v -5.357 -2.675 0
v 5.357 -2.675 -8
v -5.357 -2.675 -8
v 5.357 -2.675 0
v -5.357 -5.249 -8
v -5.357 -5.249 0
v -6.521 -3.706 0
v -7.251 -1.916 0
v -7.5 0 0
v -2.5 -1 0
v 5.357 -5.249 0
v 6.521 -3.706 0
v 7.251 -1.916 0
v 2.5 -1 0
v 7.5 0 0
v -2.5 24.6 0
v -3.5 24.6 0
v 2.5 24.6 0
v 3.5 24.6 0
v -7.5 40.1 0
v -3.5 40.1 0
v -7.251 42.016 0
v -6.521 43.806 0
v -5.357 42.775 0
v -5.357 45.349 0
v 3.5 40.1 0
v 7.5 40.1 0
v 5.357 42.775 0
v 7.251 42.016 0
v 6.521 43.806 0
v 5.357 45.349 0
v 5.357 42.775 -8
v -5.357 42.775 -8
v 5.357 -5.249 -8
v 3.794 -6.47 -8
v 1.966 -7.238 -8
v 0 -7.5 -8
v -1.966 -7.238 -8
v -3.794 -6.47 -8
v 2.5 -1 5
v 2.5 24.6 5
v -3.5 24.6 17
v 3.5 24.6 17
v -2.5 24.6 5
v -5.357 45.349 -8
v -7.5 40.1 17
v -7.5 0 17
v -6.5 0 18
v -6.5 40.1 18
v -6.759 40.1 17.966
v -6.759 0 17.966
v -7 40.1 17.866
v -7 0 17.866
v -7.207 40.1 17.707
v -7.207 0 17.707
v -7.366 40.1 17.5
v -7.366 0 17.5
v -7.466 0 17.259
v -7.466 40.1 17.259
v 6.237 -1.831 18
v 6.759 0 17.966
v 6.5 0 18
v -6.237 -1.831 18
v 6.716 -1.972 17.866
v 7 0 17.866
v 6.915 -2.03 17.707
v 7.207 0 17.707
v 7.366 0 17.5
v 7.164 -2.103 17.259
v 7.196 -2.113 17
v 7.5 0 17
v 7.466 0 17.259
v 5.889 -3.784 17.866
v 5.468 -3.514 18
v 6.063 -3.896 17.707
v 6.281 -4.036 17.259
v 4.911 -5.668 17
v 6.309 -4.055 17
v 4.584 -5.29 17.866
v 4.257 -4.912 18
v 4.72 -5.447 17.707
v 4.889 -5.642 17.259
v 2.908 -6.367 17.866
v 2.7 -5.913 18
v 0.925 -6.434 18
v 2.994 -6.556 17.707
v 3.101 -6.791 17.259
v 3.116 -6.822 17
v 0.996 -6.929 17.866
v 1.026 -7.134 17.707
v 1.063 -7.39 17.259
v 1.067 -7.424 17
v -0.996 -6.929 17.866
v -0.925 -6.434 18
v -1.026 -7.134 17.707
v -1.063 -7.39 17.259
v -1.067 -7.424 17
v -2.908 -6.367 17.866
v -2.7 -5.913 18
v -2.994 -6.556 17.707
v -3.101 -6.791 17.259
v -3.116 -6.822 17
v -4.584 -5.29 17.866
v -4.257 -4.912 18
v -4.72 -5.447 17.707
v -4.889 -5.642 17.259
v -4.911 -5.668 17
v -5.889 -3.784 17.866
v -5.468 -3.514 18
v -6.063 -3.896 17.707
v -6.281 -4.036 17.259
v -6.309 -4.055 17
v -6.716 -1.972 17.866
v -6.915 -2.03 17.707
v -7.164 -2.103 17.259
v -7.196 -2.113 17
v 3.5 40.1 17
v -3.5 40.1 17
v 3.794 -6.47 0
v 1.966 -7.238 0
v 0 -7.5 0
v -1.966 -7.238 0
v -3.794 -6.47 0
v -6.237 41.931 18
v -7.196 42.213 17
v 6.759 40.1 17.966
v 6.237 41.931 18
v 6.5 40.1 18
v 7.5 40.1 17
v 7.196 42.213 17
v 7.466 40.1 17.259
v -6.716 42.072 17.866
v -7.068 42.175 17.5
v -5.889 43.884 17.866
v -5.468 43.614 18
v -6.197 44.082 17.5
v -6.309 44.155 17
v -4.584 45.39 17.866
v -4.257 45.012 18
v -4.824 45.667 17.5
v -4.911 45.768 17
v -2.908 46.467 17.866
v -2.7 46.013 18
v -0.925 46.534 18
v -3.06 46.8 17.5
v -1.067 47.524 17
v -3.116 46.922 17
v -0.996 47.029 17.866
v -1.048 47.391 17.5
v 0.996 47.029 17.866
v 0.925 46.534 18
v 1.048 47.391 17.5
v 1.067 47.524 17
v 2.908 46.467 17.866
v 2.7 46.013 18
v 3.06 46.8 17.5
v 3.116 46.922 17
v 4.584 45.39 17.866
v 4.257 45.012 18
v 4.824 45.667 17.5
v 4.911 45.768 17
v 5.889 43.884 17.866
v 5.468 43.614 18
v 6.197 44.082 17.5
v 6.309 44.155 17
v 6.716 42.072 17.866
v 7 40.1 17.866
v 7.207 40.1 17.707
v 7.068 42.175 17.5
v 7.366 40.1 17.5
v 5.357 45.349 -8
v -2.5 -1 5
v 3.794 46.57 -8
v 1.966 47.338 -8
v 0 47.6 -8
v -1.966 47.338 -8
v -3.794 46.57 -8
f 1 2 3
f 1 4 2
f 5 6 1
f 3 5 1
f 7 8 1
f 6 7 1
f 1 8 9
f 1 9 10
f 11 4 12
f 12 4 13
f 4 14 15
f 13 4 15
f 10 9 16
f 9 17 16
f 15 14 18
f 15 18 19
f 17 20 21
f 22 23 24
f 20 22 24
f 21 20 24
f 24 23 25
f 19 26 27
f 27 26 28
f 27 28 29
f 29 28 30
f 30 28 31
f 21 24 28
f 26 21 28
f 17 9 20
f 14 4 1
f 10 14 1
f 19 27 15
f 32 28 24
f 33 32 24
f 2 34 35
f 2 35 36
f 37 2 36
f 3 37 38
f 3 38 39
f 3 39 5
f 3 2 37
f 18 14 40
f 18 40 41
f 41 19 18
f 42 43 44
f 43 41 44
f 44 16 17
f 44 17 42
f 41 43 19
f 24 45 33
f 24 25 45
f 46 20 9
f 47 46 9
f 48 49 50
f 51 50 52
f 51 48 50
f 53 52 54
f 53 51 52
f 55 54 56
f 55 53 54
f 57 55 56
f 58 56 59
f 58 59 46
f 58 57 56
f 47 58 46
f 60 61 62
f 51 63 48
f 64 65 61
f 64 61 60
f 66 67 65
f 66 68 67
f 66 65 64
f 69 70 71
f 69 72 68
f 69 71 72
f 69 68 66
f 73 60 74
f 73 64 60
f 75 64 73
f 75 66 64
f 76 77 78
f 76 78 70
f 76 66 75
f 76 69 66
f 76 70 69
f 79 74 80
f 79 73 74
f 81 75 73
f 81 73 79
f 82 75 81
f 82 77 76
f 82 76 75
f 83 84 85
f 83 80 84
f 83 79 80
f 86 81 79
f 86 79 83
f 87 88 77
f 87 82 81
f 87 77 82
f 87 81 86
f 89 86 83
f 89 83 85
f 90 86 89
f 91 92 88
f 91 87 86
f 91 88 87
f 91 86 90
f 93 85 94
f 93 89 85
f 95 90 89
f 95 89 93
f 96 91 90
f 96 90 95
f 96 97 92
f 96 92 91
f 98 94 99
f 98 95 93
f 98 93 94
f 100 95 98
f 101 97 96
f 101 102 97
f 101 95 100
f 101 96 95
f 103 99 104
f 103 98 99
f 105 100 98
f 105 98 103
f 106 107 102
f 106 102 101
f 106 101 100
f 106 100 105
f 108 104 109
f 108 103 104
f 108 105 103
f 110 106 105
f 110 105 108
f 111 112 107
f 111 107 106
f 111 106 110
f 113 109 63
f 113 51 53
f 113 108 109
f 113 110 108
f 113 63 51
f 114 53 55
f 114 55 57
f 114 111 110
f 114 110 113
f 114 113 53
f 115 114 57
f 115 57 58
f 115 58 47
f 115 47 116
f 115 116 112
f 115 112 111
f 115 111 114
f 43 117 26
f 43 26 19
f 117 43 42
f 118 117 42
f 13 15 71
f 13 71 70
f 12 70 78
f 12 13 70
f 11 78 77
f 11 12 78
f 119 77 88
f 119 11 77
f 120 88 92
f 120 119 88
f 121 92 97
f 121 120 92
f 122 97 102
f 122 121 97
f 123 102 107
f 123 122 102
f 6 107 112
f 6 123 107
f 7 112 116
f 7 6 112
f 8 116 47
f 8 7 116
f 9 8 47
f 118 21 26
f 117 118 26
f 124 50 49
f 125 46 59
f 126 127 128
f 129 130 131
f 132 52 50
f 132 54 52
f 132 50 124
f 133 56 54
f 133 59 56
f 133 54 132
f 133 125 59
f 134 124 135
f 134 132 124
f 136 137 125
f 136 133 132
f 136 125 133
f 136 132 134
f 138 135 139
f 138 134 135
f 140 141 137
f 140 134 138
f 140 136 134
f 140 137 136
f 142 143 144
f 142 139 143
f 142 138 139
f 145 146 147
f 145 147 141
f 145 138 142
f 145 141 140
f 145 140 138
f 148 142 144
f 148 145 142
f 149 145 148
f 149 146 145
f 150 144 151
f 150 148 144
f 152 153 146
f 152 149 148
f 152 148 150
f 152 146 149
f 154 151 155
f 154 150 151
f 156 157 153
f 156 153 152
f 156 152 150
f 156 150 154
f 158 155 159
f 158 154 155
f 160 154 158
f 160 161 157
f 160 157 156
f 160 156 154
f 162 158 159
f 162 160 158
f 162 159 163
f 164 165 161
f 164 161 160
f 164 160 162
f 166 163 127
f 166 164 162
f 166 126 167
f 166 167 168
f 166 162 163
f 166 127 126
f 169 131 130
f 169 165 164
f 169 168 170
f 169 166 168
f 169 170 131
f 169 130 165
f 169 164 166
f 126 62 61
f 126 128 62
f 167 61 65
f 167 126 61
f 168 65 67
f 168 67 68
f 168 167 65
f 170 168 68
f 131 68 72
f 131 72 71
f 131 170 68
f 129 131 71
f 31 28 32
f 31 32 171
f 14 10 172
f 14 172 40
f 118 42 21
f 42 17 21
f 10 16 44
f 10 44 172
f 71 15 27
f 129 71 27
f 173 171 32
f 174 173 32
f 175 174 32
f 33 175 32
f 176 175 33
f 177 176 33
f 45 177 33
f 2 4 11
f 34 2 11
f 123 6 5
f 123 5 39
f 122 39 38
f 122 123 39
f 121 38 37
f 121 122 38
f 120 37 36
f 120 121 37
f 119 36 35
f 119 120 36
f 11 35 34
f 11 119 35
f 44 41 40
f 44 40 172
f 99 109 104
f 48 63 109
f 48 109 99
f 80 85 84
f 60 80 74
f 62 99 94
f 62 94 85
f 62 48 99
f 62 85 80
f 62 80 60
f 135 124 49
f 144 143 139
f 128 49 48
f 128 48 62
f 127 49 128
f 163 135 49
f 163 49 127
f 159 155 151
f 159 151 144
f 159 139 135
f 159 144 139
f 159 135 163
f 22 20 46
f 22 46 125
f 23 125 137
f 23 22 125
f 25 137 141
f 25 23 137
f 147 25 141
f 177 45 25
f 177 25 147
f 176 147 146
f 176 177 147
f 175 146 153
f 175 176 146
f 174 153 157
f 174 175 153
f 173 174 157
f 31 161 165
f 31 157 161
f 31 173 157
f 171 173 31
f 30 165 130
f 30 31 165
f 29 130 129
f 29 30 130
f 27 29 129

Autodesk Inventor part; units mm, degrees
ref_plane "YZ Plane" through (0, 0, 0) normal (1, 0, 0) x (0, 1, 0)
ref_plane "XZ Plane" through (0, 0, 0) normal (0, 1, 0) x (-1, 0, 0)
ref_plane "XY Plane" through (0, 0, 0) normal (0, 0, 1) x (1, 0, 0)
sketch "Boceto1" plane through (0, 0, 0) normal (0, 0, 1) x (1, 0, 0)
  line L0 (0, 0) -> (0, 40.1) construction
  line L1 (7.5, 0) -> (7.5, 40.1)
  line L2 (-7.5, 40.1) -> (-7.5, 0)
  arc A0 (-7.5, 0) -> (7.5, 0) centre (0, 0) ccw
  arc A1 (7.5, 40.1) -> (-7.5, 40.1) centre (0, 40.1) ccw
  point P0 (0, 20.05)
  dimension "d0" = 40.1
  dimension "d1" = 15
extrude "Extrusión1" add sketch "Boceto1" along normal blind 18
sketch "Boceto2" plane through (0, 0, 0) normal (0, 0, -1) x (-1, 0, 0)
  arc A0 (7.5, 40.1) -> (-7.5, 40.1) centre (0, 40.1) ccw projected
  line L0 (0, 40.1) -> (0, 24.6)
  line L1 (0, 24.6) -> (-3.5, 24.6)
  line L2 (-3.5, 24.6) -> (3.5, 24.6)
  line L3 (3.5, 24.6) -> (3.5, 40.1)
  line L4 (3.5, 40.1) -> (-3.5, 40.1)
  line L5 (-3.5, 40.1) -> (-3.5, 24.6)
  point P0 (0, 0)
  dimension "d4" = 15.5
  dimension "d5" = 3.5
  dimension "d6" = 7
extrude "Extrusión2" cut sketch "Boceto2" against normal blind 17
sketch "Boceto3" plane through (0, 0, 0) normal (0, 0, -1) x (-1, 0, 0)
  line L0 (-3.5, 40.1) -> (3.5, 40.1) projected
  line L1 (0, 40.1) -> (0, 41.1)
  line L2 (7.5, 40.1) -> (7.5, 0) projected
  line L3 (7.5, 20.05) -> (-7.5, 20.05)
  line L4 (-7.5, 0) -> (-7.5, 40.1) projected
  line L5 (0, 0) -> (0, -1)
  line L6 (-5.3571, 42.7751) -> (-5.3571, 44.0501)
  line L7 (-5.3571, -2.6751) -> (-5.3571, -3.9501)
  line L8 (-5.3571, 44.0501) -> (-5.3571, 45.3489)
  arc A0 (7.5, 40.1) -> (-7.5, 40.1) centre (0, 40.1) ccw projected
  arc A1 (5.3571, 45.3489) -> (-5.3571, 45.3489) centre (0, 40.1) ccw
  arc A2 (-5.3571, -5.2489) -> (5.3571, -5.2489) centre (0, 0) ccw
  line L9 (-5.3571, -3.9501) -> (-5.3571, -5.2489)
  line L10 (5.3571, -4.6499) -> (5.3571, -5.2489)
  arc A3 (-7.5, 0) -> (7.5, 0) centre (0, 0) ccw projected
  line L11 (5.3571, 45.3489) -> (5.3571, 42.7751)
  line L12 (-5.3571, 42.7751) -> (5.3571, 42.7751)
  line L13 (5.3571, -4.6499) -> (5.3571, -2.6751)
  line L14 (-5.3571, -2.6751) -> (5.3571, -2.6751)
  point P0 (4.6429, 42.4001)
  dimension "d10" = 1
extrude "Extrusión3" add sketch "Boceto3" along normal blind 8 contours L11 L12 L6 L8 A0 | A2 L9 L7 L14 L13 L10
sketch "Boceto4" plane through (0, 0, 0) normal (0, 0, -1) x (-1, 0, 0)
  line L0 (2.5, 24.6) -> (2.5, -1)
  line L1 (2.5, -1) -> (-2.5, -1)
  line L2 (-2.5, -1) -> (-2.5, 24.6)
  line L3 (-2.5, 24.6) -> (2.5, 24.6)
  line L4 (3.5, 24.6) -> (-3.5, 24.6) projected
  point P0 (0, 0)
extrude "Extrusión4" cut sketch "Boceto4" against normal blind 5
fillet "Empalme1" radius 1 4 edges at (0, 47.6, 18) (-7.5, 20.05, 18) (0, -7.5, 18) (7.5, 20.05, 18)
properties part number "Tapa carcasa Luis"
